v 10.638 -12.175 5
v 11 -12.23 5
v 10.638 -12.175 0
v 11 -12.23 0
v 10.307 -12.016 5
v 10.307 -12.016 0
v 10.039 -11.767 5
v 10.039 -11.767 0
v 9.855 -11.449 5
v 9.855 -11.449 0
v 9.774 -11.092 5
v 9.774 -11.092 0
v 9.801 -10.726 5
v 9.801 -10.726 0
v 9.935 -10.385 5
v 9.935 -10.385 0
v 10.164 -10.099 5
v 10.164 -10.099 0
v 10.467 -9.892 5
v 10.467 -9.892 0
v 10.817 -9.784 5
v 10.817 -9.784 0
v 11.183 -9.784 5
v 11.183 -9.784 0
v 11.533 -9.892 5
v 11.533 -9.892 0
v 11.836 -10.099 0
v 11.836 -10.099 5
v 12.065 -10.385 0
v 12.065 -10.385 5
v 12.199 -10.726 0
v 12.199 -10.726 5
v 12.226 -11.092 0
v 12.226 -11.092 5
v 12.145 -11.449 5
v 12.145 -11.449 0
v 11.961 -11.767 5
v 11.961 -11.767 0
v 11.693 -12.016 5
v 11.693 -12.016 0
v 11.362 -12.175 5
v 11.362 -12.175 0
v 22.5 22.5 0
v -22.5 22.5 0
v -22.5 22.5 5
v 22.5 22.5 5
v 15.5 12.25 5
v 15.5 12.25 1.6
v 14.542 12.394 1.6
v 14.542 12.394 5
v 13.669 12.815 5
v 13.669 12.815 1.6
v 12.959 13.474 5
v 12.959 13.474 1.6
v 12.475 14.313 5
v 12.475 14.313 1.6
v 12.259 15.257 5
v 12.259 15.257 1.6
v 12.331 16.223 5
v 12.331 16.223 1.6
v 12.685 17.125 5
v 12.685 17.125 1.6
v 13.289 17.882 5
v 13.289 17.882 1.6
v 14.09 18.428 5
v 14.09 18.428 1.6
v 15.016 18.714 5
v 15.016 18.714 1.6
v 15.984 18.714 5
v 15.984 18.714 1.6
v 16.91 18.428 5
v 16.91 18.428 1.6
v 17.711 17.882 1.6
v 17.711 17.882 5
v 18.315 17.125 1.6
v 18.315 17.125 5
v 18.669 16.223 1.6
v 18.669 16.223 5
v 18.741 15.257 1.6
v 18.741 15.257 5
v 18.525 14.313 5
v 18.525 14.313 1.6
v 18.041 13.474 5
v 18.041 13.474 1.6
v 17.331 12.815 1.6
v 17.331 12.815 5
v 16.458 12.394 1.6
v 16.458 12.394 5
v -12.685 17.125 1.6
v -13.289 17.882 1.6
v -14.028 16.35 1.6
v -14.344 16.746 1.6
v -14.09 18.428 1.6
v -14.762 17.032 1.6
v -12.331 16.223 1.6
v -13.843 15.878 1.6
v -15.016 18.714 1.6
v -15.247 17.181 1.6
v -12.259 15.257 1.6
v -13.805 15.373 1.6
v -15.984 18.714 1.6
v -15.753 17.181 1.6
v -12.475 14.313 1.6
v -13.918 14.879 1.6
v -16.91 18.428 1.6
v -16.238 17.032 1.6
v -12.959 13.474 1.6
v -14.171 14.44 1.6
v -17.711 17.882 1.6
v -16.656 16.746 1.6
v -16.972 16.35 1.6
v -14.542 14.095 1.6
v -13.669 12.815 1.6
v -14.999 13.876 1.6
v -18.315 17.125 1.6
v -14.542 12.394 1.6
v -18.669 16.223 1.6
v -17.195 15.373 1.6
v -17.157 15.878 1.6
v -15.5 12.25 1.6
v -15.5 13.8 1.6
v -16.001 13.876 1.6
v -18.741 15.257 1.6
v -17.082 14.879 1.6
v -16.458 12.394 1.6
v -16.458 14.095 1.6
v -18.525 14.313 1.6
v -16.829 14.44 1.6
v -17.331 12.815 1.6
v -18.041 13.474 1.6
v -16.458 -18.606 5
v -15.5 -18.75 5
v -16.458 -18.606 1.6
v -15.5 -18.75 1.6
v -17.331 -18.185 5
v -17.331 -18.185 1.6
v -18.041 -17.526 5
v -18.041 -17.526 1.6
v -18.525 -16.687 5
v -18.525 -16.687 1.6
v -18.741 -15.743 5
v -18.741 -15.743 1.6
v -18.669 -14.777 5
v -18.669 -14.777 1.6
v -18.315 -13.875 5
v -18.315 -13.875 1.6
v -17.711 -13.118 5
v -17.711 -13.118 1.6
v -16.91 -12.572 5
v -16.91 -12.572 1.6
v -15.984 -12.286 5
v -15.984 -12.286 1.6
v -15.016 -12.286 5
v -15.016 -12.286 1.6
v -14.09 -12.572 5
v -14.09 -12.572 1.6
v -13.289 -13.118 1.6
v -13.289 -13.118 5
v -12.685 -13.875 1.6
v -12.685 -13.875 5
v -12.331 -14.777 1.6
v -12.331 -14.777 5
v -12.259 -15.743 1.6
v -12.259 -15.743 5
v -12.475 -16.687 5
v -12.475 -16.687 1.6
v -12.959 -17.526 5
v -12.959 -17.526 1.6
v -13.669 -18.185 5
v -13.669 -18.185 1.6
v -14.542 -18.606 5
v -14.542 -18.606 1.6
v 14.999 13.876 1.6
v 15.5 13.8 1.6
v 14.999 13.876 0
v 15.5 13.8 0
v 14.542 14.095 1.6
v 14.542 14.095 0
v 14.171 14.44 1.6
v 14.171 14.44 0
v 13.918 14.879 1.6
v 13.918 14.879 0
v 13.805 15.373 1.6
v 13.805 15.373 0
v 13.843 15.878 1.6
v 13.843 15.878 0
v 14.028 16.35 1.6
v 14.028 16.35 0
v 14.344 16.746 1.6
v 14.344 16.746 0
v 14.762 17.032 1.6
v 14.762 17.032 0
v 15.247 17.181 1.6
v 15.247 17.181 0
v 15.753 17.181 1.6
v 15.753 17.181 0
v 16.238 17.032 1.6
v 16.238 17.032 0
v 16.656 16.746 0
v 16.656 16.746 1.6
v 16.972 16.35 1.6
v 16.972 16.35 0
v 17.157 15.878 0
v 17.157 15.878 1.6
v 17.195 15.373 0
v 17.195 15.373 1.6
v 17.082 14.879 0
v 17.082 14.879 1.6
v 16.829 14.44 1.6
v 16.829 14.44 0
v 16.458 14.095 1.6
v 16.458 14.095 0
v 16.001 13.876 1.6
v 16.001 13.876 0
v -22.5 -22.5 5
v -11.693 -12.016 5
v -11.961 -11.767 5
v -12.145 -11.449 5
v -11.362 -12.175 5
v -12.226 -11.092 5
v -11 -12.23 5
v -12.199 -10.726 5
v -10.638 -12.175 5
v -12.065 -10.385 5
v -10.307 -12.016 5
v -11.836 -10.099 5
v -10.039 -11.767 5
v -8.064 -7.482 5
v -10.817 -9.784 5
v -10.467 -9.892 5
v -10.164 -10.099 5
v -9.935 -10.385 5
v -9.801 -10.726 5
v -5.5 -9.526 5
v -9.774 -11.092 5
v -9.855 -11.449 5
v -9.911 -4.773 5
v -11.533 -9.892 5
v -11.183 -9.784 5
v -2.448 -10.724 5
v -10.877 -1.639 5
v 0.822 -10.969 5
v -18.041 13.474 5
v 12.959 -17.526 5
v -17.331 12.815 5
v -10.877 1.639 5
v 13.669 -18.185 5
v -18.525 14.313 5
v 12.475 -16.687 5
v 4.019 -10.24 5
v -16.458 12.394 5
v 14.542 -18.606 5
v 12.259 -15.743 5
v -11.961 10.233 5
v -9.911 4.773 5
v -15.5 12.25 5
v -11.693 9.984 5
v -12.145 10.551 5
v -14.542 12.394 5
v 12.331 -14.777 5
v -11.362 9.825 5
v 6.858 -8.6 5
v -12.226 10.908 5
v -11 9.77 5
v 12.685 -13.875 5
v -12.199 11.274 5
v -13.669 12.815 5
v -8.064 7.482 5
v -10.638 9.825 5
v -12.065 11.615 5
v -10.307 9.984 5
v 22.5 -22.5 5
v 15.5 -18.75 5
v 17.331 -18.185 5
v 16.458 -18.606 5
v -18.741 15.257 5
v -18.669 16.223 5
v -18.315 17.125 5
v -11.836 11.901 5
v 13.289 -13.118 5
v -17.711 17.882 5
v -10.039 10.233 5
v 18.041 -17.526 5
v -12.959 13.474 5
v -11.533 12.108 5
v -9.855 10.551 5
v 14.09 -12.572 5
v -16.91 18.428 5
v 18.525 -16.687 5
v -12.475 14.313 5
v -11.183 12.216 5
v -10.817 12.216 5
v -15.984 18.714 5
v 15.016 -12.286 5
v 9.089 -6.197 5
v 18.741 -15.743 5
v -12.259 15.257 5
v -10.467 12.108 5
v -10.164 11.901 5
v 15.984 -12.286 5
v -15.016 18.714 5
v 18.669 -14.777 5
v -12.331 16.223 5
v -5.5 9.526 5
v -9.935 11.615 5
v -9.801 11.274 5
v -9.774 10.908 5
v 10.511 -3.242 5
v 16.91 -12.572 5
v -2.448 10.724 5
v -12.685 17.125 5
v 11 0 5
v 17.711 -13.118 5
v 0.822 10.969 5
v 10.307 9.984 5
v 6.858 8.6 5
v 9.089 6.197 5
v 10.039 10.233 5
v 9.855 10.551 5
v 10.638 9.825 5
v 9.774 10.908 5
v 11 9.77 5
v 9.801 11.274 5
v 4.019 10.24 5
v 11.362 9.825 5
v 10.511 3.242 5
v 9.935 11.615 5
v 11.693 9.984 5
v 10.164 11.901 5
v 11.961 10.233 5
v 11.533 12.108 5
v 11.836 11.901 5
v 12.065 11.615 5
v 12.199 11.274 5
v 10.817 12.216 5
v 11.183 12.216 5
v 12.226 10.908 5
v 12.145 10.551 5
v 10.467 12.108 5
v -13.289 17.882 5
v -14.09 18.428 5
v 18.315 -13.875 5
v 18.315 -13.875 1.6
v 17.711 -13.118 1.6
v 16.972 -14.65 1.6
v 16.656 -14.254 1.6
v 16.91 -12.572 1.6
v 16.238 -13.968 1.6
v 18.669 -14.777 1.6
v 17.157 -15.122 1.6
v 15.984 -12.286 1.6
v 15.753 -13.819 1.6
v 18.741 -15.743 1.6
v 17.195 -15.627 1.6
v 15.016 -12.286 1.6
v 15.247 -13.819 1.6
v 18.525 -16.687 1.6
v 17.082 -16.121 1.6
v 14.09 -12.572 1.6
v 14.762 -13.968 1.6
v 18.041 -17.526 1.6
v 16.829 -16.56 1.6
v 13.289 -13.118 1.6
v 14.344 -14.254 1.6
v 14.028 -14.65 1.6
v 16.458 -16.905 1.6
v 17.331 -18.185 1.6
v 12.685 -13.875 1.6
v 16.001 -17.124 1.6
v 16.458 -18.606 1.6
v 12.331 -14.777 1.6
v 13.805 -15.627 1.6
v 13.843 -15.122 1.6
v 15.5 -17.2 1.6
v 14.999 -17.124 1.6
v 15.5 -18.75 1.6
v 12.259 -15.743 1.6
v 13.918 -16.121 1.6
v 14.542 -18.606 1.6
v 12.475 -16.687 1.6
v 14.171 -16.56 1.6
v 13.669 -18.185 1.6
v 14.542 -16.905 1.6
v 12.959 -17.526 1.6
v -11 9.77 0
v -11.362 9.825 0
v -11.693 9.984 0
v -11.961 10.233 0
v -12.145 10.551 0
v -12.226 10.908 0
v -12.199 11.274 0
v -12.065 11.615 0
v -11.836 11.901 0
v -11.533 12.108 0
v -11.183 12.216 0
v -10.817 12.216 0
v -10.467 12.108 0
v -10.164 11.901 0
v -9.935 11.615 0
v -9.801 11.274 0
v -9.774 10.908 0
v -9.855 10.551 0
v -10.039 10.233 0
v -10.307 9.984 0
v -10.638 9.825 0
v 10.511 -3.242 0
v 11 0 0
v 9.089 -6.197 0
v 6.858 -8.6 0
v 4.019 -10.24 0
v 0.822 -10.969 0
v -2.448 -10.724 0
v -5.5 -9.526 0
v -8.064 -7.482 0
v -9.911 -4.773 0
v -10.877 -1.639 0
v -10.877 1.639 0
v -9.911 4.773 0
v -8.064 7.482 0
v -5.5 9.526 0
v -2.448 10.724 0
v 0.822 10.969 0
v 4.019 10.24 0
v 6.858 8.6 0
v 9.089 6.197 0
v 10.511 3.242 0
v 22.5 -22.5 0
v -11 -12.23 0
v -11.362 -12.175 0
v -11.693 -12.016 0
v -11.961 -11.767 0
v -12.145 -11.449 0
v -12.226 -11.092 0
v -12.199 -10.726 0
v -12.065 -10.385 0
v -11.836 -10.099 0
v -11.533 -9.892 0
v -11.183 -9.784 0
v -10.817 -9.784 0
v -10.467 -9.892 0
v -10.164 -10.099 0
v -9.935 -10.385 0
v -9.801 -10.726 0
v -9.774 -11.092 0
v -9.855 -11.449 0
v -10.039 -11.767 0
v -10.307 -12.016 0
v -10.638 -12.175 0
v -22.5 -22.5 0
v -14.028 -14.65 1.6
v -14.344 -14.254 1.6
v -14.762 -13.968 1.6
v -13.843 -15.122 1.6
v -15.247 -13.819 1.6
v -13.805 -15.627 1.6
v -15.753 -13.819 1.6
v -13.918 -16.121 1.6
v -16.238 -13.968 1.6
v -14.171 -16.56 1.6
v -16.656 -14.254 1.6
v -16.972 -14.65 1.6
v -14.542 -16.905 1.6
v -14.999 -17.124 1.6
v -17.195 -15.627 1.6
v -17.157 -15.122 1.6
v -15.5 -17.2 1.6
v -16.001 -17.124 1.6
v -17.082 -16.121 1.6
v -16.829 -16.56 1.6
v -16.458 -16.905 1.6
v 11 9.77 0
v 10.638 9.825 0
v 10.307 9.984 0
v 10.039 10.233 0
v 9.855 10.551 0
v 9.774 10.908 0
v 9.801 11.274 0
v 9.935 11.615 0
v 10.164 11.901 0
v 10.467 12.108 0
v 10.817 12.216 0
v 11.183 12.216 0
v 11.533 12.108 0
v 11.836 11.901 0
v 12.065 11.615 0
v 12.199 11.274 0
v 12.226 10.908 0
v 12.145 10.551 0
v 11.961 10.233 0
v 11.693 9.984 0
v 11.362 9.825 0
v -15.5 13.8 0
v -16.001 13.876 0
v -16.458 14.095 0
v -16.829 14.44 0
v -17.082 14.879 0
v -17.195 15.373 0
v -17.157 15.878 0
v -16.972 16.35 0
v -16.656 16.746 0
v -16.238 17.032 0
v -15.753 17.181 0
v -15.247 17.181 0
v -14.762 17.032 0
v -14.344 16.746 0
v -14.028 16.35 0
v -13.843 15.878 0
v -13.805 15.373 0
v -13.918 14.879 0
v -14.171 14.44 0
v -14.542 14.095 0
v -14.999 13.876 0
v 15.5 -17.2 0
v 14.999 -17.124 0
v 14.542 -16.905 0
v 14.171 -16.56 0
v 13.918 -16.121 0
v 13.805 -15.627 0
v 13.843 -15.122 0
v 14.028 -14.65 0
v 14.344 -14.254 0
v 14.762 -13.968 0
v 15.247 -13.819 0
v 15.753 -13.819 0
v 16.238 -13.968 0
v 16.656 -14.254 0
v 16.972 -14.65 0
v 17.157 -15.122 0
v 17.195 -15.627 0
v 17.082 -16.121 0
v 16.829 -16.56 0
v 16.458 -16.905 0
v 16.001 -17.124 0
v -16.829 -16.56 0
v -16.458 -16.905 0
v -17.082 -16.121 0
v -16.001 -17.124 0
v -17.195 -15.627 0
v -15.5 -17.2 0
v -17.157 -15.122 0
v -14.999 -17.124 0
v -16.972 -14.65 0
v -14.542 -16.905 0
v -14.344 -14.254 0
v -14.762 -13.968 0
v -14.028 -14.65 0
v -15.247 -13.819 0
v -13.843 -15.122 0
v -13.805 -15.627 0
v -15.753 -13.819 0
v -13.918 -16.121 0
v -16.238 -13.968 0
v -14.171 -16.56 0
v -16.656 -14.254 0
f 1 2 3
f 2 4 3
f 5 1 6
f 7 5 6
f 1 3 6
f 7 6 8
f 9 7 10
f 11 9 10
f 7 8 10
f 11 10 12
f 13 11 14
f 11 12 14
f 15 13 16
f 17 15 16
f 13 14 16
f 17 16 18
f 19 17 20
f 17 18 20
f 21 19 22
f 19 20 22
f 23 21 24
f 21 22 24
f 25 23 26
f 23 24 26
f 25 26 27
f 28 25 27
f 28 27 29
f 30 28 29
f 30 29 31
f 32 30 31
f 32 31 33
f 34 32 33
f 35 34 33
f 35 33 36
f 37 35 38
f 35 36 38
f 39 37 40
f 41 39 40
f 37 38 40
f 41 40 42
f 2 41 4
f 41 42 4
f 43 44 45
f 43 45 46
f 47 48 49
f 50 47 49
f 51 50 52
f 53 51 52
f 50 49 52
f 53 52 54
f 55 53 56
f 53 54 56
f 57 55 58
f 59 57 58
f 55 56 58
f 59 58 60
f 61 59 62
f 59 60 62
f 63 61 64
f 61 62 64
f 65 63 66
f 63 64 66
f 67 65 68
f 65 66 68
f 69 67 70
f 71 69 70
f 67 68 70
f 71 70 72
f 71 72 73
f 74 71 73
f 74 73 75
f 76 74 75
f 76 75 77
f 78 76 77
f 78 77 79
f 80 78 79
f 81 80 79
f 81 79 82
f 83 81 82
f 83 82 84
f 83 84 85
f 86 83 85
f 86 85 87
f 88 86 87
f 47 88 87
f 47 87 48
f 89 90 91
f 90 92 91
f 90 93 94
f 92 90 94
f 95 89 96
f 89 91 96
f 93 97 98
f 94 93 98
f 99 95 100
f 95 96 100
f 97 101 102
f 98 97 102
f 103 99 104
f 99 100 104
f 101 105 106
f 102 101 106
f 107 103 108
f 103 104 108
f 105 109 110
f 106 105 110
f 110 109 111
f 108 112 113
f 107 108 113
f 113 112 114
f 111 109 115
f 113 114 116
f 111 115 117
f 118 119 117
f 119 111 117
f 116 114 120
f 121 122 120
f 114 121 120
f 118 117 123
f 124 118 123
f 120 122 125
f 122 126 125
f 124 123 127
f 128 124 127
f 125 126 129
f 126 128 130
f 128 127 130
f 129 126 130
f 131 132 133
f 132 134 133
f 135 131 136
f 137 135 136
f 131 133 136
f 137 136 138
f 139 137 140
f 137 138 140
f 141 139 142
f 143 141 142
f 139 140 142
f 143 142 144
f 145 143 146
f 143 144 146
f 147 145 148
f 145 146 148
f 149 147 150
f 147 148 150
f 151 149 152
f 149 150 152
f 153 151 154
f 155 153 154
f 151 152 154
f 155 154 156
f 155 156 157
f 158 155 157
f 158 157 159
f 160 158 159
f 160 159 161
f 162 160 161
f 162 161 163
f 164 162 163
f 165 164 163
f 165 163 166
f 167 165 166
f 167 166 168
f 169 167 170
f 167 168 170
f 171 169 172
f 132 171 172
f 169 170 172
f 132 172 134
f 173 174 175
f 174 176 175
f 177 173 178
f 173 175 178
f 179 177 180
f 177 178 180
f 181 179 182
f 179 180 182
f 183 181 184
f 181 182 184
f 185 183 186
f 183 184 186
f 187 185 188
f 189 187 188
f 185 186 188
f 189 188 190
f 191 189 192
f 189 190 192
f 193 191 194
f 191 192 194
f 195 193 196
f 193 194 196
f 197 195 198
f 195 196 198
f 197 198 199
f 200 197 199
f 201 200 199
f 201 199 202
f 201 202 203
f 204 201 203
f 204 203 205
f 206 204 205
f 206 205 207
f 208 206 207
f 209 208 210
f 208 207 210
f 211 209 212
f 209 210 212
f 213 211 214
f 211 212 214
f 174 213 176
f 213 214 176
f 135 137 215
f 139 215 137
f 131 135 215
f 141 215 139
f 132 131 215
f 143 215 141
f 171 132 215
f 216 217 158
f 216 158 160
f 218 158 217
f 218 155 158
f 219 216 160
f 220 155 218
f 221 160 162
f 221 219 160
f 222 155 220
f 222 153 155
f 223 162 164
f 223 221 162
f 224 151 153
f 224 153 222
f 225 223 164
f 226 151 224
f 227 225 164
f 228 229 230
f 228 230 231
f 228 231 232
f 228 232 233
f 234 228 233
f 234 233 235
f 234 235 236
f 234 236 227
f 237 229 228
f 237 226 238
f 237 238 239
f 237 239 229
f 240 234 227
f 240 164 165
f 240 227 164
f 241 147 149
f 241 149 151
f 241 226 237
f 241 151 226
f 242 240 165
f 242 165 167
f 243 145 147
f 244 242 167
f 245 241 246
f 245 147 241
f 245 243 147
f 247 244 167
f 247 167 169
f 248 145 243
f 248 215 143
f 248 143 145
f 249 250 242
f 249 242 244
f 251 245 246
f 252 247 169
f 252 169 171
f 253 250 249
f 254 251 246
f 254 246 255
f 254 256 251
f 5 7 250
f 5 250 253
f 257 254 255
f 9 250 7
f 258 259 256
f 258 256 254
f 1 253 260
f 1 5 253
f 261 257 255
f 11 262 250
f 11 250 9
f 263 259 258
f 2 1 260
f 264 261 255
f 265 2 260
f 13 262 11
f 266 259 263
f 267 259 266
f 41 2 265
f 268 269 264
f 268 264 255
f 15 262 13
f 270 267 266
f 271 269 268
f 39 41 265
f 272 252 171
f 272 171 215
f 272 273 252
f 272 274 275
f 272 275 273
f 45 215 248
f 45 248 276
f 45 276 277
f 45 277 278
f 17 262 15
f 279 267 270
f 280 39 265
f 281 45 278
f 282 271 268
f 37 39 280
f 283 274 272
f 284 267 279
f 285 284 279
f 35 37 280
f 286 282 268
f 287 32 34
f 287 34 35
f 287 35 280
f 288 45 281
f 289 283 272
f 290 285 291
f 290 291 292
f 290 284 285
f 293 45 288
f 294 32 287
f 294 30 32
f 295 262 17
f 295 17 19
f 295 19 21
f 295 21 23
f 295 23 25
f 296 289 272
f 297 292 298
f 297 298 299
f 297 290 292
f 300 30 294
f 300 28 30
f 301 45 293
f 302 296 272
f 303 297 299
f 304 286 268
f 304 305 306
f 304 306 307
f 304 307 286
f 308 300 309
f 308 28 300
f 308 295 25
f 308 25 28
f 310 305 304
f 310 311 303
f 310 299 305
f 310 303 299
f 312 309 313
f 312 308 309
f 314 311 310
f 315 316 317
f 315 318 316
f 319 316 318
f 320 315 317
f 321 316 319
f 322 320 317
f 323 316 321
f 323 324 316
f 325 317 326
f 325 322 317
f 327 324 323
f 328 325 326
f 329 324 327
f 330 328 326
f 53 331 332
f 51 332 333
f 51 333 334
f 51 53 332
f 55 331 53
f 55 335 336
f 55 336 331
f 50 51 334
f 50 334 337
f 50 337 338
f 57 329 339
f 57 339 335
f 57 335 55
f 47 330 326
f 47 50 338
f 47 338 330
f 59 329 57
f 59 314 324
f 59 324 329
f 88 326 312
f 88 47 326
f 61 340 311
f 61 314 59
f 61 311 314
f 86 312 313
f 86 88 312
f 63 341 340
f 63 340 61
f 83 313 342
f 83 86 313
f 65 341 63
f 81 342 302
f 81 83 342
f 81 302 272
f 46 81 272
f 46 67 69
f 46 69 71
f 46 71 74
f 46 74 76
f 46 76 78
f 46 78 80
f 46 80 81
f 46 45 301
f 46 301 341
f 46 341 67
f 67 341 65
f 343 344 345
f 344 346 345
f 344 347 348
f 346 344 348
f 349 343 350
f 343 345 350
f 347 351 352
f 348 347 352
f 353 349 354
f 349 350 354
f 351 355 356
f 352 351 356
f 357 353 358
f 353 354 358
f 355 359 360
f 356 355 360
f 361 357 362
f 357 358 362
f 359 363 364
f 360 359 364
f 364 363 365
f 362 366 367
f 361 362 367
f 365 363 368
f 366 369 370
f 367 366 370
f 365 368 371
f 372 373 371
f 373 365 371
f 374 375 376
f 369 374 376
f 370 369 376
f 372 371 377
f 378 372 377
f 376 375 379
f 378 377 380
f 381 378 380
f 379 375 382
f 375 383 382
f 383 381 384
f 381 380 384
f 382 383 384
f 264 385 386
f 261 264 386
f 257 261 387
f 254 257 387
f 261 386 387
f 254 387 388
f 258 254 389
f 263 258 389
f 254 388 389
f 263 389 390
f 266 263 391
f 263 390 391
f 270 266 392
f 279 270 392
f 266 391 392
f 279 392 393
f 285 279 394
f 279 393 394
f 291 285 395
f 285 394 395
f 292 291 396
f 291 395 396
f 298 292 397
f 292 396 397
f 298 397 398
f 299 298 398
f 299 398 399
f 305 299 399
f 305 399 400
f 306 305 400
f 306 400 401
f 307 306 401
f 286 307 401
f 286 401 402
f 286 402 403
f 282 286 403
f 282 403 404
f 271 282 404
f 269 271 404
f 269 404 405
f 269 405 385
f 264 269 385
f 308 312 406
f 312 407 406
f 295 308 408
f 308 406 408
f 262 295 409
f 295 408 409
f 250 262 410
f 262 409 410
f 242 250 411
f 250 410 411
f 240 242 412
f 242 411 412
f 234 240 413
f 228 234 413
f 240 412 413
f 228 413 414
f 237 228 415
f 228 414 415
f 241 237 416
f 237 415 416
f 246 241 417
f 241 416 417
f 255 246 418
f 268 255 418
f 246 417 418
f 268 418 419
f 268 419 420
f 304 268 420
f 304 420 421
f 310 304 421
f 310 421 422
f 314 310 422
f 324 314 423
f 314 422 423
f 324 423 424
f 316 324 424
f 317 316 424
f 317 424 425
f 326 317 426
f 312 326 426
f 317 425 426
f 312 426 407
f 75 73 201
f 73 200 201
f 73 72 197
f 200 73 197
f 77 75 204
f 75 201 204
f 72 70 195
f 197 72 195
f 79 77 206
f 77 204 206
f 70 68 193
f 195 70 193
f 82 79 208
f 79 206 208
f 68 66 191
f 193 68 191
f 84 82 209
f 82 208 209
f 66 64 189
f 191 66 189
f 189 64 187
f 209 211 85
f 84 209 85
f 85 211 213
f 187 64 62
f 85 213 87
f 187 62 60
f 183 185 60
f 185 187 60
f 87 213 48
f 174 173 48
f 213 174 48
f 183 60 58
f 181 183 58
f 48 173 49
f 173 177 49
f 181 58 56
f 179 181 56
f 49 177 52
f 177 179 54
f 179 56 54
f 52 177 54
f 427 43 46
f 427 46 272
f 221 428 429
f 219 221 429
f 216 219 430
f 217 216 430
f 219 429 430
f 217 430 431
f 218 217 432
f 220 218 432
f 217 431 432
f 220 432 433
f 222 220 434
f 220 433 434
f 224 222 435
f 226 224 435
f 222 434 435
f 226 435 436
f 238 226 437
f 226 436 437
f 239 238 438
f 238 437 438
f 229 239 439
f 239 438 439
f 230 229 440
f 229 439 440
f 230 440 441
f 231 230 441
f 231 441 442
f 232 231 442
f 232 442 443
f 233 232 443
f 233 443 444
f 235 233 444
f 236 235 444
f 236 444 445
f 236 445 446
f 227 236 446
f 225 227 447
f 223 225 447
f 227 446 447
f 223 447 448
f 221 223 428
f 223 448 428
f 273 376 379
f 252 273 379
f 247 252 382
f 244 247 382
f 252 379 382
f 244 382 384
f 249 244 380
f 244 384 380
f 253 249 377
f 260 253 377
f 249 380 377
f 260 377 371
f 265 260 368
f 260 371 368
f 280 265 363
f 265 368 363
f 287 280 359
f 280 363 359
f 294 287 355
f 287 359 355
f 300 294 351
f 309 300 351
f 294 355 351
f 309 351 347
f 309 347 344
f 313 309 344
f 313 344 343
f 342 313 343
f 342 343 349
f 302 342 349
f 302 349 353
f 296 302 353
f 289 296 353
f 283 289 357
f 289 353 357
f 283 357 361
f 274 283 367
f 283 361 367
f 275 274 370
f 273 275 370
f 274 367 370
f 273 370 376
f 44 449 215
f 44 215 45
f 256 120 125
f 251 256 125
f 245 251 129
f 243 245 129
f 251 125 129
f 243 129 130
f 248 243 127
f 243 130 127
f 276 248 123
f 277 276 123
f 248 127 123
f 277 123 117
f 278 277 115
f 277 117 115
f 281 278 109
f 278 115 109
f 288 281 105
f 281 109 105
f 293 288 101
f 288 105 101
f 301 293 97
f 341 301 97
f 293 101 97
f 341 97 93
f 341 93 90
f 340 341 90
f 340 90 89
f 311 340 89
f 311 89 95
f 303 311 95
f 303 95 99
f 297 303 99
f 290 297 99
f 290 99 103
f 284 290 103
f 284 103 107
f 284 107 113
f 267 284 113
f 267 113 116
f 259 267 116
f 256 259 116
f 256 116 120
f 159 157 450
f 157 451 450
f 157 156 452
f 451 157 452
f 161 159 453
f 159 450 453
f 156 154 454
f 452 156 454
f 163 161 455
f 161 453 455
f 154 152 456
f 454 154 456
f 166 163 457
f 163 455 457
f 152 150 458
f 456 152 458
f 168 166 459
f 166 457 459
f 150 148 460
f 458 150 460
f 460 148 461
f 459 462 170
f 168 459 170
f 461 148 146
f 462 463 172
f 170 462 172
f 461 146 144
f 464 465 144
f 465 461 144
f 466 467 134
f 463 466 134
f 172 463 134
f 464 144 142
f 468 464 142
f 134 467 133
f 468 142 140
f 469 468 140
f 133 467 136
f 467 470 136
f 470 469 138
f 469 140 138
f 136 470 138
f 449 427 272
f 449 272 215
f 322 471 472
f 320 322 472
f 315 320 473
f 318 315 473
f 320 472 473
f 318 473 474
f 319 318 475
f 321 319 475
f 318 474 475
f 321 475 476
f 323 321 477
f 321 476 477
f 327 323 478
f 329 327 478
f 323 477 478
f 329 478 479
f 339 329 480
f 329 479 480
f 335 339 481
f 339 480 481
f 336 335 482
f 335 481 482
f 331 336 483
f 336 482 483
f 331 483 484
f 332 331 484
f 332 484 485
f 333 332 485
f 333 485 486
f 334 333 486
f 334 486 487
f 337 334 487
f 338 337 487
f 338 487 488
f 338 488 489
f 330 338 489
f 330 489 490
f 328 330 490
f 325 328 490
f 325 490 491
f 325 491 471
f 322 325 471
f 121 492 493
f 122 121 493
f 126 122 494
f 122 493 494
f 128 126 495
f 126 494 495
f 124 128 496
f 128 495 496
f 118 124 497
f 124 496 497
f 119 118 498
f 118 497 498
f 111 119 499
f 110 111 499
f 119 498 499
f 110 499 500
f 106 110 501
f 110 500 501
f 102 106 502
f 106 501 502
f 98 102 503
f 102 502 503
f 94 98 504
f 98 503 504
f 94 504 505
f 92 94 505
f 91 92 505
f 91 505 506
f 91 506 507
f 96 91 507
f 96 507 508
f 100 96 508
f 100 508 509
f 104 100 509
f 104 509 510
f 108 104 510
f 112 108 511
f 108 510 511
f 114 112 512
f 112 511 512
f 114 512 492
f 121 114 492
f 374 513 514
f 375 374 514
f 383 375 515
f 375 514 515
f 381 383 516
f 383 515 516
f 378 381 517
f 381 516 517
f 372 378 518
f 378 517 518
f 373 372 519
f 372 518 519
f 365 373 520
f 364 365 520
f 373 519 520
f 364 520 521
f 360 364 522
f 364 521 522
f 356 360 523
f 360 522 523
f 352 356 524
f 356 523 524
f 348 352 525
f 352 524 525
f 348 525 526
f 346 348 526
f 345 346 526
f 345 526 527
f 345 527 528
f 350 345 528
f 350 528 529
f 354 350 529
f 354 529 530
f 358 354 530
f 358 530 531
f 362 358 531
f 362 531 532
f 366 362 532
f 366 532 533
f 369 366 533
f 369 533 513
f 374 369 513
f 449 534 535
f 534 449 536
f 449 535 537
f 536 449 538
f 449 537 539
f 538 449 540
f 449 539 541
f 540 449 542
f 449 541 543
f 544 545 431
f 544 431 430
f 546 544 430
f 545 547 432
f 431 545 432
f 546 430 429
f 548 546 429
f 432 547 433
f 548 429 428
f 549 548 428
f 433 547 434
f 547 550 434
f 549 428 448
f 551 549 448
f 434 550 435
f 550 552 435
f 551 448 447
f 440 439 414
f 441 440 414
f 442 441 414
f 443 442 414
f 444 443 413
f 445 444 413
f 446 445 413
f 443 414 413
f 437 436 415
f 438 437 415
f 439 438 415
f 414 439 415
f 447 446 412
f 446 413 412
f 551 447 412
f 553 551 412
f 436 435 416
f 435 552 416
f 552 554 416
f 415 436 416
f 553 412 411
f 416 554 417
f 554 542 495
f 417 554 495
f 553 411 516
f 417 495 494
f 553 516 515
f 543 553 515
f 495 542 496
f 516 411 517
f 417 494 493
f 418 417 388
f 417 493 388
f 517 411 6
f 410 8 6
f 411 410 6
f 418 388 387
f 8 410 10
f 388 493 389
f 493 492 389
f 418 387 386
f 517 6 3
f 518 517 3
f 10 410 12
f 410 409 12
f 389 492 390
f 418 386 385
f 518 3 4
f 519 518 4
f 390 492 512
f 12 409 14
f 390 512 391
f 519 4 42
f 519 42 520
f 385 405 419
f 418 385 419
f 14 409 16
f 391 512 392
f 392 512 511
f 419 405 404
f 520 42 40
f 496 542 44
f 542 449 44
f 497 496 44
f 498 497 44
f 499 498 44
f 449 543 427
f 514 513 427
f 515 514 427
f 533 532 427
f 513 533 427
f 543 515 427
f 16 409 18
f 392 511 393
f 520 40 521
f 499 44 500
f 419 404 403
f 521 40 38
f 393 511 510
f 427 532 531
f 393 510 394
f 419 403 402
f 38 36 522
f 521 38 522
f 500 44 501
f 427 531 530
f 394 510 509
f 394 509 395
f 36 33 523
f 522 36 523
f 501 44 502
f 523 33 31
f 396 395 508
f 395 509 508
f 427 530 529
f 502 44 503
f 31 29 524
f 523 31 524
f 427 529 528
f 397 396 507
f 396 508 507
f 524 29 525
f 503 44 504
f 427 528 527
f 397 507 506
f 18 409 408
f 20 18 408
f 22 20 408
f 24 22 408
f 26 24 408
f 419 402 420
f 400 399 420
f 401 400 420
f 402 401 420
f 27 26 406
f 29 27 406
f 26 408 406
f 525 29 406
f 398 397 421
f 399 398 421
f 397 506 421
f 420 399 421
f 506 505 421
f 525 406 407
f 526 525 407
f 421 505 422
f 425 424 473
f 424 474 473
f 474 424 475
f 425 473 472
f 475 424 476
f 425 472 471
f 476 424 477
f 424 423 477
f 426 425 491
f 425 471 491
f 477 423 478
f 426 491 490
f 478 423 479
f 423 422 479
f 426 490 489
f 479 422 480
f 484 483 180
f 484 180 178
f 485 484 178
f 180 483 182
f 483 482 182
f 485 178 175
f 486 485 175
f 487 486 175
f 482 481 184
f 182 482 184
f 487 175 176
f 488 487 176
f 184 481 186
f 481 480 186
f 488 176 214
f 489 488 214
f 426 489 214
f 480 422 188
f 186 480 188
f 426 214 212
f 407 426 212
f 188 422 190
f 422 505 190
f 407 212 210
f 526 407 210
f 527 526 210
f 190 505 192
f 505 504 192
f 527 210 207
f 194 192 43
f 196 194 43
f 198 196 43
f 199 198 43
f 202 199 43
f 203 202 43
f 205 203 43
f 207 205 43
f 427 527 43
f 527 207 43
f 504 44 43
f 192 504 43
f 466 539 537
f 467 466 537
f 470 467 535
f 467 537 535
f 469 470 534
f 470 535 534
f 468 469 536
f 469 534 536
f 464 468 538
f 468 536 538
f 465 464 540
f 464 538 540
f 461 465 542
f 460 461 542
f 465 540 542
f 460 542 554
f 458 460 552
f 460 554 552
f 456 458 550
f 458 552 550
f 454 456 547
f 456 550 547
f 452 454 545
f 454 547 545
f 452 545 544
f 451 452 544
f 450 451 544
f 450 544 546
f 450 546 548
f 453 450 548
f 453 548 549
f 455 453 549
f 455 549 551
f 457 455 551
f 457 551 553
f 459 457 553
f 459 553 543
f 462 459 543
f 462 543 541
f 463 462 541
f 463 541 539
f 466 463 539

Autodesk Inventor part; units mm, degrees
ref_plane "YZ Plane" through (0, 0, 0) normal (1, 0, 0) x (0, 1, 0)
ref_plane "XZ Plane" through (0, 0, 0) normal (0, 1, 0) x (-1, 0, 0)
ref_plane "XY Plane" through (0, 0, 0) normal (0, 0, 1) x (1, 0, 0)
sketch "Skizze1" plane through (0, 0, 0) normal (0, 0, 1) x (1, 0, 0)
  line L0 (-22.5, 22.5) -> (22.5, 22.5)
  line L1 (22.5, 22.5) -> (22.5, -22.5)
  line L2 (22.5, -22.5) -> (-22.5, -22.5)
  line L3 (-22.5, -22.5) -> (-22.5, 22.5)
  circle A0 centre (0, 0) radius 11
  line L4 (-31.5, 0) -> (31.5, 0) projected
  line L5 (0, -31.5) -> (0, 31.5) projected
  dimension "d0" = 22
  dimension "d1" = 45
extrude "Extrusion1" add sketch "Skizze1" along normal blind 5 contours L0 L5 A0 L4 L3 | L0 L1 L4 A0 L5 | L4 A0 L5 L2 L3 | L1 L2 L5 A0 L4
sketch "Skizze2" plane through (0, 0, 5) normal (0, 0, 1) x (1, 0, 0)
  line L0 (-11, 11) -> (11, 11)
  line L1 (11, 11) -> (11, -11)
  line L2 (11, -11) -> (-11, -11)
  line L3 (-11, -11) -> (-11, 11)
  line L4 (-31.5, 0) -> (31.5, 0) projected
  line L5 (0, -31.5) -> (0, 31.5) projected
  dimension "d4" = 22
hole "Bohrung1" at (-11, 11, 5) at (11, 11, 5) at (11, -11, 5) at (-11, -11, 5) direction (0, 0, -1) diameter 2.459 end through all thread size "M3x0.5" class "6H" standard "ISO Metric profile"
sketch "Skizze3" plane through (0, 0, 5) normal (0, 0, 1) x (1, 0, 0)
  line L0 (-31.5, 0) -> (31.5, 0) projected
  line L1 (0, -31.5) -> (0, 31.5) projected
  line L2 (-15.5, 15.5) -> (15.5, 15.5)
  line L3 (15.5, 15.5) -> (15.5, -15.5)
  line L4 (15.5, -15.5) -> (-15.5, -15.5)
  line L5 (-15.5, -15.5) -> (-15.5, 15.5)
  dimension "d12" = 31
hole "Bohrung2" at (15.5, -15.5, 5) at (-15.5, 15.5, 5) at (15.5, 15.5, 5) at (-15.5, -15.5, 5) direction (0, 0, -1) diameter 3.4 end through all counterbore diameter 6.5 counterbore depth 3.4
properties part number "13_0204_060"
